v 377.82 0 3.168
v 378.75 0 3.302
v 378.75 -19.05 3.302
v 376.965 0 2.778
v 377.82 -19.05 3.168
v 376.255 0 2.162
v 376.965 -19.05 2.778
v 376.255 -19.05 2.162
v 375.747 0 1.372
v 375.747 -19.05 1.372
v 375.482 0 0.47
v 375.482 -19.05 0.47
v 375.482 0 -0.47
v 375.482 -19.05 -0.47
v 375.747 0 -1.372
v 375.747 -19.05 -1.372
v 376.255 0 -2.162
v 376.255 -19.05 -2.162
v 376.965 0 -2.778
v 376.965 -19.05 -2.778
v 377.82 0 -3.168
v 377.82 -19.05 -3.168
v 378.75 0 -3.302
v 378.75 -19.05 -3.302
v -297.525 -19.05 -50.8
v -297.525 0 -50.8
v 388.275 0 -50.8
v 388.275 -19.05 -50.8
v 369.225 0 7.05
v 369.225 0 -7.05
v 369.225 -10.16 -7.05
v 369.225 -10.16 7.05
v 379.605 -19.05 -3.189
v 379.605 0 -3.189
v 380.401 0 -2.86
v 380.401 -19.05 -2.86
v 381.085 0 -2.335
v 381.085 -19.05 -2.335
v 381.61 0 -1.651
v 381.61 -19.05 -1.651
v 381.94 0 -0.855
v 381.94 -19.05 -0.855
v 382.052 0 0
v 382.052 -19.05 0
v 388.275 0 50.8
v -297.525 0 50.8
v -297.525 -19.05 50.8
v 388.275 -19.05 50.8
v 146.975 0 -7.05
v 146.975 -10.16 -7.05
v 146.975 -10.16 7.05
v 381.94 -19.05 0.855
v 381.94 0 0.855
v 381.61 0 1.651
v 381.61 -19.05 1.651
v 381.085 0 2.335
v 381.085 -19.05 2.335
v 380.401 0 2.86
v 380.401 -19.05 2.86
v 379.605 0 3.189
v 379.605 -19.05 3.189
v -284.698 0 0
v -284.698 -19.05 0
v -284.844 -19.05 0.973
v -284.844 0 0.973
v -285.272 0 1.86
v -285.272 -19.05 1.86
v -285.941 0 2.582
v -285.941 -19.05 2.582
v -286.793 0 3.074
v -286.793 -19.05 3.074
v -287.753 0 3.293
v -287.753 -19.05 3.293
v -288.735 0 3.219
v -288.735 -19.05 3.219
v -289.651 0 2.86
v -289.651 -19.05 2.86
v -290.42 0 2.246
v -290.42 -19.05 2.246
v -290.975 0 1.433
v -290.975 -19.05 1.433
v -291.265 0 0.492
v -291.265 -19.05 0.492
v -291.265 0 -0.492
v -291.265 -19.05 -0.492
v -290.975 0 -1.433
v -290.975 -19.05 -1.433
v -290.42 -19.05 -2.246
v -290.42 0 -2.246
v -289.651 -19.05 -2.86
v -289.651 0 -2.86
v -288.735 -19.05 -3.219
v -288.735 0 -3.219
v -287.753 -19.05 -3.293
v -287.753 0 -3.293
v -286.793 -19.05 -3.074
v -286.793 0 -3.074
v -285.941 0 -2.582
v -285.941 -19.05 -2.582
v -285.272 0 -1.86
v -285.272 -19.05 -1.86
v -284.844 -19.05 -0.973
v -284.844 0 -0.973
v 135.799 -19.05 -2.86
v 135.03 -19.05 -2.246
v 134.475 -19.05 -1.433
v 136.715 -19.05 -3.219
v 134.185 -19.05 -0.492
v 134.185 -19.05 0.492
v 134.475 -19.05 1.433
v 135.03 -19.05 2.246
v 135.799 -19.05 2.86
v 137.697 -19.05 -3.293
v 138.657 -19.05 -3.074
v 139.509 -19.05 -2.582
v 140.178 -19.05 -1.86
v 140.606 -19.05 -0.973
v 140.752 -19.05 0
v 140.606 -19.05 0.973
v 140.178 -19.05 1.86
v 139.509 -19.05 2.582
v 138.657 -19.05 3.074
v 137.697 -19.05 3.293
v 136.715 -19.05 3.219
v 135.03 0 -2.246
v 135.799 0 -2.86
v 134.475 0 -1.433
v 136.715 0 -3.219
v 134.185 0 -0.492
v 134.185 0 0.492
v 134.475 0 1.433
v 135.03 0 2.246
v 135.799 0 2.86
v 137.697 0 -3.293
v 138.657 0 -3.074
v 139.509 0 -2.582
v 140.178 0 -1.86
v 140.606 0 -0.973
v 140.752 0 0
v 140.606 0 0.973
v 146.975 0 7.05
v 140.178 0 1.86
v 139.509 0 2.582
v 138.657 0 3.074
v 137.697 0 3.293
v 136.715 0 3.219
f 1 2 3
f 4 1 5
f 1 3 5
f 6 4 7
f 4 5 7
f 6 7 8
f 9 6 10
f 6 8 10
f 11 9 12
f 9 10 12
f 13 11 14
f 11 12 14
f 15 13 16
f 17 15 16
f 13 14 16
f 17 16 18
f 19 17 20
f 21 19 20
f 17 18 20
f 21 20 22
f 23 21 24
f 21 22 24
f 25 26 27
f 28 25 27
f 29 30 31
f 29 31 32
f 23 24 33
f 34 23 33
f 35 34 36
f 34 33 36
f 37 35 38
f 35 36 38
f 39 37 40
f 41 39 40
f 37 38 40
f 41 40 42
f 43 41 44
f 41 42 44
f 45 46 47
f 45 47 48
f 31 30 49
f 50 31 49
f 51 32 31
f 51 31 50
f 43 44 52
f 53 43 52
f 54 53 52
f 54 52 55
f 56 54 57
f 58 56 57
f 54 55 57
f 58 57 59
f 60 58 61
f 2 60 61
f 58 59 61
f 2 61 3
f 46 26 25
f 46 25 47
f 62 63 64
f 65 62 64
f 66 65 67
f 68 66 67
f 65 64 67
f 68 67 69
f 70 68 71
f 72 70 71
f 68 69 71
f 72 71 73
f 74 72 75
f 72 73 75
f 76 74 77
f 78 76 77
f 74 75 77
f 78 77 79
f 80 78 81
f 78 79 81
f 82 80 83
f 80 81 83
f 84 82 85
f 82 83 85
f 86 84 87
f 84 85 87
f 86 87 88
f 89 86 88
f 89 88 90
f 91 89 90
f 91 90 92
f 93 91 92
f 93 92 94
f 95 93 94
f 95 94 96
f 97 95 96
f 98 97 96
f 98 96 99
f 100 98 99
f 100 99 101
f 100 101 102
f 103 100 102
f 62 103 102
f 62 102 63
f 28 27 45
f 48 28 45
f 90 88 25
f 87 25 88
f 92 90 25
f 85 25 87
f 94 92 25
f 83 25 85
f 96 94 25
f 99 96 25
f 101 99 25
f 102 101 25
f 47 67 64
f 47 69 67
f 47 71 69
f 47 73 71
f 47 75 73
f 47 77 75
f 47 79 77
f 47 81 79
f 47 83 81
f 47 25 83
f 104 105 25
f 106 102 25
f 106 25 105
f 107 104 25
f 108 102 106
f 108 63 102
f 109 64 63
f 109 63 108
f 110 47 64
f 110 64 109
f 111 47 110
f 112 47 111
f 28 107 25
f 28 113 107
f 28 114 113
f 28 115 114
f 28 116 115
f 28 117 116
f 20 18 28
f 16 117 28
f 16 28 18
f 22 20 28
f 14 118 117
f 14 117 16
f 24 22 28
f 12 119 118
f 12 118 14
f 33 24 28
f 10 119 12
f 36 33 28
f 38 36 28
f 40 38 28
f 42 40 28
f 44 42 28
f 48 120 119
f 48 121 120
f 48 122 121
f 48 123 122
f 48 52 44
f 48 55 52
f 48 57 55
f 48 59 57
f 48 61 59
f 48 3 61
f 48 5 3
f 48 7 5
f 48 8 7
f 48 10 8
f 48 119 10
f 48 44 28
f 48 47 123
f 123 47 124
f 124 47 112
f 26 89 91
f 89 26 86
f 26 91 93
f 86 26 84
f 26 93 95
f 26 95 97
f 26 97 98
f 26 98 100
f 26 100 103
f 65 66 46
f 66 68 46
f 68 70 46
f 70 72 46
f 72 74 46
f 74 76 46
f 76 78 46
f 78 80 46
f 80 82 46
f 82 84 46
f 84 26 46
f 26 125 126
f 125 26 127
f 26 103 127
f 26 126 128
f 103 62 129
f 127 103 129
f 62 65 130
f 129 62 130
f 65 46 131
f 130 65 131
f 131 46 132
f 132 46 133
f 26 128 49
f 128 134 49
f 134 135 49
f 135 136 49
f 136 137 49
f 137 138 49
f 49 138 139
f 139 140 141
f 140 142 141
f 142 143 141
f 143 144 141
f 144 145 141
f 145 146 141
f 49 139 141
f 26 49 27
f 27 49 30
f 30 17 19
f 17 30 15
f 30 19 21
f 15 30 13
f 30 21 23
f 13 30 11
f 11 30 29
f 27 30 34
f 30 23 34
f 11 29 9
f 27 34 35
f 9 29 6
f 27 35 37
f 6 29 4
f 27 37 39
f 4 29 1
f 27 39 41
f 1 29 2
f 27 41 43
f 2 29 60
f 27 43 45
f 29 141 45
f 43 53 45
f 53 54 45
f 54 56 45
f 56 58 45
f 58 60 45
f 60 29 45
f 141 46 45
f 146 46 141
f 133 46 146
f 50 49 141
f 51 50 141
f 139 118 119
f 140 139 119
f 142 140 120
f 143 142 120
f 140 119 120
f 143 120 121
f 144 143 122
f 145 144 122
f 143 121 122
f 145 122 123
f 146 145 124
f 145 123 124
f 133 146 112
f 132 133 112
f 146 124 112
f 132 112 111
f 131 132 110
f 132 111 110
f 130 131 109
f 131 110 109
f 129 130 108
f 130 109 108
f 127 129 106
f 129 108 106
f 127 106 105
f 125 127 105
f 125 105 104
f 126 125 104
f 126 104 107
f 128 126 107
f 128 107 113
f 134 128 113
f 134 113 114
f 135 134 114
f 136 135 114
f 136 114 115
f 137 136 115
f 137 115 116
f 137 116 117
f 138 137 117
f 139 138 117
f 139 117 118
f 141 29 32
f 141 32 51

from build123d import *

# Parameters (mm, degrees)
F0_W     = 685.8
F0_H     = 101.6
F1_DEPTH = 19.05
F2_W     = 222.25
F2_H     = 14.1
F3_DEPTH = 10.16
F4_R     = 3.302
F5_DEPTH = 25.4


with BuildPart() as f1:
    # F0 (on Front) → F1 (new body)
    with BuildSketch(Plane.XZ):
        with Locations((45.375204, 0)):
            Rectangle(F0_W, F0_H)
    extrude(amount=F1_DEPTH)

    # F2 (on face) → F3 (cut)
    with BuildSketch(Plane(origin=(0, 0, 0), x_dir=(-1, 0, 0), z_dir=(0, 1, 0))):
        with Locations((-258.100204, 0)):
            Rectangle(F2_W, F2_H)
    extrude(amount=-F3_DEPTH, mode=Mode.SUBTRACT)

    # F4 (on face) → F5 (cut)
    with BuildSketch(Plane.XZ.offset(19.05)):
        with BuildLine():
            ThreePointArc((382.052204, 0), (381.085071, 2.334867), (378.750204, 3.302))
            Line((378.750204, 3.302), (378.750204, 0))
            Line((378.750204, 0), (378.750204, -3.302))
            ThreePointArc((378.750204, -3.302), (381.085071, -2.334867), (382.052204, 0))
        make_face()
        with BuildLine():
            Line((378.750204, 0), (378.750204, 3.302))
            ThreePointArc((378.750204, 3.302), (375.448204, 0), (378.750204, -3.302))
            Line((378.750204, -3.302), (378.750204, 0))
        make_face()
        with Locations((137.450204, 0)):
            Circle(F4_R)
        with Locations((-287.999796, 0)):
            Circle(F4_R)
    extrude(amount=-F5_DEPTH, mode=Mode.SUBTRACT)


solid = f1.part
